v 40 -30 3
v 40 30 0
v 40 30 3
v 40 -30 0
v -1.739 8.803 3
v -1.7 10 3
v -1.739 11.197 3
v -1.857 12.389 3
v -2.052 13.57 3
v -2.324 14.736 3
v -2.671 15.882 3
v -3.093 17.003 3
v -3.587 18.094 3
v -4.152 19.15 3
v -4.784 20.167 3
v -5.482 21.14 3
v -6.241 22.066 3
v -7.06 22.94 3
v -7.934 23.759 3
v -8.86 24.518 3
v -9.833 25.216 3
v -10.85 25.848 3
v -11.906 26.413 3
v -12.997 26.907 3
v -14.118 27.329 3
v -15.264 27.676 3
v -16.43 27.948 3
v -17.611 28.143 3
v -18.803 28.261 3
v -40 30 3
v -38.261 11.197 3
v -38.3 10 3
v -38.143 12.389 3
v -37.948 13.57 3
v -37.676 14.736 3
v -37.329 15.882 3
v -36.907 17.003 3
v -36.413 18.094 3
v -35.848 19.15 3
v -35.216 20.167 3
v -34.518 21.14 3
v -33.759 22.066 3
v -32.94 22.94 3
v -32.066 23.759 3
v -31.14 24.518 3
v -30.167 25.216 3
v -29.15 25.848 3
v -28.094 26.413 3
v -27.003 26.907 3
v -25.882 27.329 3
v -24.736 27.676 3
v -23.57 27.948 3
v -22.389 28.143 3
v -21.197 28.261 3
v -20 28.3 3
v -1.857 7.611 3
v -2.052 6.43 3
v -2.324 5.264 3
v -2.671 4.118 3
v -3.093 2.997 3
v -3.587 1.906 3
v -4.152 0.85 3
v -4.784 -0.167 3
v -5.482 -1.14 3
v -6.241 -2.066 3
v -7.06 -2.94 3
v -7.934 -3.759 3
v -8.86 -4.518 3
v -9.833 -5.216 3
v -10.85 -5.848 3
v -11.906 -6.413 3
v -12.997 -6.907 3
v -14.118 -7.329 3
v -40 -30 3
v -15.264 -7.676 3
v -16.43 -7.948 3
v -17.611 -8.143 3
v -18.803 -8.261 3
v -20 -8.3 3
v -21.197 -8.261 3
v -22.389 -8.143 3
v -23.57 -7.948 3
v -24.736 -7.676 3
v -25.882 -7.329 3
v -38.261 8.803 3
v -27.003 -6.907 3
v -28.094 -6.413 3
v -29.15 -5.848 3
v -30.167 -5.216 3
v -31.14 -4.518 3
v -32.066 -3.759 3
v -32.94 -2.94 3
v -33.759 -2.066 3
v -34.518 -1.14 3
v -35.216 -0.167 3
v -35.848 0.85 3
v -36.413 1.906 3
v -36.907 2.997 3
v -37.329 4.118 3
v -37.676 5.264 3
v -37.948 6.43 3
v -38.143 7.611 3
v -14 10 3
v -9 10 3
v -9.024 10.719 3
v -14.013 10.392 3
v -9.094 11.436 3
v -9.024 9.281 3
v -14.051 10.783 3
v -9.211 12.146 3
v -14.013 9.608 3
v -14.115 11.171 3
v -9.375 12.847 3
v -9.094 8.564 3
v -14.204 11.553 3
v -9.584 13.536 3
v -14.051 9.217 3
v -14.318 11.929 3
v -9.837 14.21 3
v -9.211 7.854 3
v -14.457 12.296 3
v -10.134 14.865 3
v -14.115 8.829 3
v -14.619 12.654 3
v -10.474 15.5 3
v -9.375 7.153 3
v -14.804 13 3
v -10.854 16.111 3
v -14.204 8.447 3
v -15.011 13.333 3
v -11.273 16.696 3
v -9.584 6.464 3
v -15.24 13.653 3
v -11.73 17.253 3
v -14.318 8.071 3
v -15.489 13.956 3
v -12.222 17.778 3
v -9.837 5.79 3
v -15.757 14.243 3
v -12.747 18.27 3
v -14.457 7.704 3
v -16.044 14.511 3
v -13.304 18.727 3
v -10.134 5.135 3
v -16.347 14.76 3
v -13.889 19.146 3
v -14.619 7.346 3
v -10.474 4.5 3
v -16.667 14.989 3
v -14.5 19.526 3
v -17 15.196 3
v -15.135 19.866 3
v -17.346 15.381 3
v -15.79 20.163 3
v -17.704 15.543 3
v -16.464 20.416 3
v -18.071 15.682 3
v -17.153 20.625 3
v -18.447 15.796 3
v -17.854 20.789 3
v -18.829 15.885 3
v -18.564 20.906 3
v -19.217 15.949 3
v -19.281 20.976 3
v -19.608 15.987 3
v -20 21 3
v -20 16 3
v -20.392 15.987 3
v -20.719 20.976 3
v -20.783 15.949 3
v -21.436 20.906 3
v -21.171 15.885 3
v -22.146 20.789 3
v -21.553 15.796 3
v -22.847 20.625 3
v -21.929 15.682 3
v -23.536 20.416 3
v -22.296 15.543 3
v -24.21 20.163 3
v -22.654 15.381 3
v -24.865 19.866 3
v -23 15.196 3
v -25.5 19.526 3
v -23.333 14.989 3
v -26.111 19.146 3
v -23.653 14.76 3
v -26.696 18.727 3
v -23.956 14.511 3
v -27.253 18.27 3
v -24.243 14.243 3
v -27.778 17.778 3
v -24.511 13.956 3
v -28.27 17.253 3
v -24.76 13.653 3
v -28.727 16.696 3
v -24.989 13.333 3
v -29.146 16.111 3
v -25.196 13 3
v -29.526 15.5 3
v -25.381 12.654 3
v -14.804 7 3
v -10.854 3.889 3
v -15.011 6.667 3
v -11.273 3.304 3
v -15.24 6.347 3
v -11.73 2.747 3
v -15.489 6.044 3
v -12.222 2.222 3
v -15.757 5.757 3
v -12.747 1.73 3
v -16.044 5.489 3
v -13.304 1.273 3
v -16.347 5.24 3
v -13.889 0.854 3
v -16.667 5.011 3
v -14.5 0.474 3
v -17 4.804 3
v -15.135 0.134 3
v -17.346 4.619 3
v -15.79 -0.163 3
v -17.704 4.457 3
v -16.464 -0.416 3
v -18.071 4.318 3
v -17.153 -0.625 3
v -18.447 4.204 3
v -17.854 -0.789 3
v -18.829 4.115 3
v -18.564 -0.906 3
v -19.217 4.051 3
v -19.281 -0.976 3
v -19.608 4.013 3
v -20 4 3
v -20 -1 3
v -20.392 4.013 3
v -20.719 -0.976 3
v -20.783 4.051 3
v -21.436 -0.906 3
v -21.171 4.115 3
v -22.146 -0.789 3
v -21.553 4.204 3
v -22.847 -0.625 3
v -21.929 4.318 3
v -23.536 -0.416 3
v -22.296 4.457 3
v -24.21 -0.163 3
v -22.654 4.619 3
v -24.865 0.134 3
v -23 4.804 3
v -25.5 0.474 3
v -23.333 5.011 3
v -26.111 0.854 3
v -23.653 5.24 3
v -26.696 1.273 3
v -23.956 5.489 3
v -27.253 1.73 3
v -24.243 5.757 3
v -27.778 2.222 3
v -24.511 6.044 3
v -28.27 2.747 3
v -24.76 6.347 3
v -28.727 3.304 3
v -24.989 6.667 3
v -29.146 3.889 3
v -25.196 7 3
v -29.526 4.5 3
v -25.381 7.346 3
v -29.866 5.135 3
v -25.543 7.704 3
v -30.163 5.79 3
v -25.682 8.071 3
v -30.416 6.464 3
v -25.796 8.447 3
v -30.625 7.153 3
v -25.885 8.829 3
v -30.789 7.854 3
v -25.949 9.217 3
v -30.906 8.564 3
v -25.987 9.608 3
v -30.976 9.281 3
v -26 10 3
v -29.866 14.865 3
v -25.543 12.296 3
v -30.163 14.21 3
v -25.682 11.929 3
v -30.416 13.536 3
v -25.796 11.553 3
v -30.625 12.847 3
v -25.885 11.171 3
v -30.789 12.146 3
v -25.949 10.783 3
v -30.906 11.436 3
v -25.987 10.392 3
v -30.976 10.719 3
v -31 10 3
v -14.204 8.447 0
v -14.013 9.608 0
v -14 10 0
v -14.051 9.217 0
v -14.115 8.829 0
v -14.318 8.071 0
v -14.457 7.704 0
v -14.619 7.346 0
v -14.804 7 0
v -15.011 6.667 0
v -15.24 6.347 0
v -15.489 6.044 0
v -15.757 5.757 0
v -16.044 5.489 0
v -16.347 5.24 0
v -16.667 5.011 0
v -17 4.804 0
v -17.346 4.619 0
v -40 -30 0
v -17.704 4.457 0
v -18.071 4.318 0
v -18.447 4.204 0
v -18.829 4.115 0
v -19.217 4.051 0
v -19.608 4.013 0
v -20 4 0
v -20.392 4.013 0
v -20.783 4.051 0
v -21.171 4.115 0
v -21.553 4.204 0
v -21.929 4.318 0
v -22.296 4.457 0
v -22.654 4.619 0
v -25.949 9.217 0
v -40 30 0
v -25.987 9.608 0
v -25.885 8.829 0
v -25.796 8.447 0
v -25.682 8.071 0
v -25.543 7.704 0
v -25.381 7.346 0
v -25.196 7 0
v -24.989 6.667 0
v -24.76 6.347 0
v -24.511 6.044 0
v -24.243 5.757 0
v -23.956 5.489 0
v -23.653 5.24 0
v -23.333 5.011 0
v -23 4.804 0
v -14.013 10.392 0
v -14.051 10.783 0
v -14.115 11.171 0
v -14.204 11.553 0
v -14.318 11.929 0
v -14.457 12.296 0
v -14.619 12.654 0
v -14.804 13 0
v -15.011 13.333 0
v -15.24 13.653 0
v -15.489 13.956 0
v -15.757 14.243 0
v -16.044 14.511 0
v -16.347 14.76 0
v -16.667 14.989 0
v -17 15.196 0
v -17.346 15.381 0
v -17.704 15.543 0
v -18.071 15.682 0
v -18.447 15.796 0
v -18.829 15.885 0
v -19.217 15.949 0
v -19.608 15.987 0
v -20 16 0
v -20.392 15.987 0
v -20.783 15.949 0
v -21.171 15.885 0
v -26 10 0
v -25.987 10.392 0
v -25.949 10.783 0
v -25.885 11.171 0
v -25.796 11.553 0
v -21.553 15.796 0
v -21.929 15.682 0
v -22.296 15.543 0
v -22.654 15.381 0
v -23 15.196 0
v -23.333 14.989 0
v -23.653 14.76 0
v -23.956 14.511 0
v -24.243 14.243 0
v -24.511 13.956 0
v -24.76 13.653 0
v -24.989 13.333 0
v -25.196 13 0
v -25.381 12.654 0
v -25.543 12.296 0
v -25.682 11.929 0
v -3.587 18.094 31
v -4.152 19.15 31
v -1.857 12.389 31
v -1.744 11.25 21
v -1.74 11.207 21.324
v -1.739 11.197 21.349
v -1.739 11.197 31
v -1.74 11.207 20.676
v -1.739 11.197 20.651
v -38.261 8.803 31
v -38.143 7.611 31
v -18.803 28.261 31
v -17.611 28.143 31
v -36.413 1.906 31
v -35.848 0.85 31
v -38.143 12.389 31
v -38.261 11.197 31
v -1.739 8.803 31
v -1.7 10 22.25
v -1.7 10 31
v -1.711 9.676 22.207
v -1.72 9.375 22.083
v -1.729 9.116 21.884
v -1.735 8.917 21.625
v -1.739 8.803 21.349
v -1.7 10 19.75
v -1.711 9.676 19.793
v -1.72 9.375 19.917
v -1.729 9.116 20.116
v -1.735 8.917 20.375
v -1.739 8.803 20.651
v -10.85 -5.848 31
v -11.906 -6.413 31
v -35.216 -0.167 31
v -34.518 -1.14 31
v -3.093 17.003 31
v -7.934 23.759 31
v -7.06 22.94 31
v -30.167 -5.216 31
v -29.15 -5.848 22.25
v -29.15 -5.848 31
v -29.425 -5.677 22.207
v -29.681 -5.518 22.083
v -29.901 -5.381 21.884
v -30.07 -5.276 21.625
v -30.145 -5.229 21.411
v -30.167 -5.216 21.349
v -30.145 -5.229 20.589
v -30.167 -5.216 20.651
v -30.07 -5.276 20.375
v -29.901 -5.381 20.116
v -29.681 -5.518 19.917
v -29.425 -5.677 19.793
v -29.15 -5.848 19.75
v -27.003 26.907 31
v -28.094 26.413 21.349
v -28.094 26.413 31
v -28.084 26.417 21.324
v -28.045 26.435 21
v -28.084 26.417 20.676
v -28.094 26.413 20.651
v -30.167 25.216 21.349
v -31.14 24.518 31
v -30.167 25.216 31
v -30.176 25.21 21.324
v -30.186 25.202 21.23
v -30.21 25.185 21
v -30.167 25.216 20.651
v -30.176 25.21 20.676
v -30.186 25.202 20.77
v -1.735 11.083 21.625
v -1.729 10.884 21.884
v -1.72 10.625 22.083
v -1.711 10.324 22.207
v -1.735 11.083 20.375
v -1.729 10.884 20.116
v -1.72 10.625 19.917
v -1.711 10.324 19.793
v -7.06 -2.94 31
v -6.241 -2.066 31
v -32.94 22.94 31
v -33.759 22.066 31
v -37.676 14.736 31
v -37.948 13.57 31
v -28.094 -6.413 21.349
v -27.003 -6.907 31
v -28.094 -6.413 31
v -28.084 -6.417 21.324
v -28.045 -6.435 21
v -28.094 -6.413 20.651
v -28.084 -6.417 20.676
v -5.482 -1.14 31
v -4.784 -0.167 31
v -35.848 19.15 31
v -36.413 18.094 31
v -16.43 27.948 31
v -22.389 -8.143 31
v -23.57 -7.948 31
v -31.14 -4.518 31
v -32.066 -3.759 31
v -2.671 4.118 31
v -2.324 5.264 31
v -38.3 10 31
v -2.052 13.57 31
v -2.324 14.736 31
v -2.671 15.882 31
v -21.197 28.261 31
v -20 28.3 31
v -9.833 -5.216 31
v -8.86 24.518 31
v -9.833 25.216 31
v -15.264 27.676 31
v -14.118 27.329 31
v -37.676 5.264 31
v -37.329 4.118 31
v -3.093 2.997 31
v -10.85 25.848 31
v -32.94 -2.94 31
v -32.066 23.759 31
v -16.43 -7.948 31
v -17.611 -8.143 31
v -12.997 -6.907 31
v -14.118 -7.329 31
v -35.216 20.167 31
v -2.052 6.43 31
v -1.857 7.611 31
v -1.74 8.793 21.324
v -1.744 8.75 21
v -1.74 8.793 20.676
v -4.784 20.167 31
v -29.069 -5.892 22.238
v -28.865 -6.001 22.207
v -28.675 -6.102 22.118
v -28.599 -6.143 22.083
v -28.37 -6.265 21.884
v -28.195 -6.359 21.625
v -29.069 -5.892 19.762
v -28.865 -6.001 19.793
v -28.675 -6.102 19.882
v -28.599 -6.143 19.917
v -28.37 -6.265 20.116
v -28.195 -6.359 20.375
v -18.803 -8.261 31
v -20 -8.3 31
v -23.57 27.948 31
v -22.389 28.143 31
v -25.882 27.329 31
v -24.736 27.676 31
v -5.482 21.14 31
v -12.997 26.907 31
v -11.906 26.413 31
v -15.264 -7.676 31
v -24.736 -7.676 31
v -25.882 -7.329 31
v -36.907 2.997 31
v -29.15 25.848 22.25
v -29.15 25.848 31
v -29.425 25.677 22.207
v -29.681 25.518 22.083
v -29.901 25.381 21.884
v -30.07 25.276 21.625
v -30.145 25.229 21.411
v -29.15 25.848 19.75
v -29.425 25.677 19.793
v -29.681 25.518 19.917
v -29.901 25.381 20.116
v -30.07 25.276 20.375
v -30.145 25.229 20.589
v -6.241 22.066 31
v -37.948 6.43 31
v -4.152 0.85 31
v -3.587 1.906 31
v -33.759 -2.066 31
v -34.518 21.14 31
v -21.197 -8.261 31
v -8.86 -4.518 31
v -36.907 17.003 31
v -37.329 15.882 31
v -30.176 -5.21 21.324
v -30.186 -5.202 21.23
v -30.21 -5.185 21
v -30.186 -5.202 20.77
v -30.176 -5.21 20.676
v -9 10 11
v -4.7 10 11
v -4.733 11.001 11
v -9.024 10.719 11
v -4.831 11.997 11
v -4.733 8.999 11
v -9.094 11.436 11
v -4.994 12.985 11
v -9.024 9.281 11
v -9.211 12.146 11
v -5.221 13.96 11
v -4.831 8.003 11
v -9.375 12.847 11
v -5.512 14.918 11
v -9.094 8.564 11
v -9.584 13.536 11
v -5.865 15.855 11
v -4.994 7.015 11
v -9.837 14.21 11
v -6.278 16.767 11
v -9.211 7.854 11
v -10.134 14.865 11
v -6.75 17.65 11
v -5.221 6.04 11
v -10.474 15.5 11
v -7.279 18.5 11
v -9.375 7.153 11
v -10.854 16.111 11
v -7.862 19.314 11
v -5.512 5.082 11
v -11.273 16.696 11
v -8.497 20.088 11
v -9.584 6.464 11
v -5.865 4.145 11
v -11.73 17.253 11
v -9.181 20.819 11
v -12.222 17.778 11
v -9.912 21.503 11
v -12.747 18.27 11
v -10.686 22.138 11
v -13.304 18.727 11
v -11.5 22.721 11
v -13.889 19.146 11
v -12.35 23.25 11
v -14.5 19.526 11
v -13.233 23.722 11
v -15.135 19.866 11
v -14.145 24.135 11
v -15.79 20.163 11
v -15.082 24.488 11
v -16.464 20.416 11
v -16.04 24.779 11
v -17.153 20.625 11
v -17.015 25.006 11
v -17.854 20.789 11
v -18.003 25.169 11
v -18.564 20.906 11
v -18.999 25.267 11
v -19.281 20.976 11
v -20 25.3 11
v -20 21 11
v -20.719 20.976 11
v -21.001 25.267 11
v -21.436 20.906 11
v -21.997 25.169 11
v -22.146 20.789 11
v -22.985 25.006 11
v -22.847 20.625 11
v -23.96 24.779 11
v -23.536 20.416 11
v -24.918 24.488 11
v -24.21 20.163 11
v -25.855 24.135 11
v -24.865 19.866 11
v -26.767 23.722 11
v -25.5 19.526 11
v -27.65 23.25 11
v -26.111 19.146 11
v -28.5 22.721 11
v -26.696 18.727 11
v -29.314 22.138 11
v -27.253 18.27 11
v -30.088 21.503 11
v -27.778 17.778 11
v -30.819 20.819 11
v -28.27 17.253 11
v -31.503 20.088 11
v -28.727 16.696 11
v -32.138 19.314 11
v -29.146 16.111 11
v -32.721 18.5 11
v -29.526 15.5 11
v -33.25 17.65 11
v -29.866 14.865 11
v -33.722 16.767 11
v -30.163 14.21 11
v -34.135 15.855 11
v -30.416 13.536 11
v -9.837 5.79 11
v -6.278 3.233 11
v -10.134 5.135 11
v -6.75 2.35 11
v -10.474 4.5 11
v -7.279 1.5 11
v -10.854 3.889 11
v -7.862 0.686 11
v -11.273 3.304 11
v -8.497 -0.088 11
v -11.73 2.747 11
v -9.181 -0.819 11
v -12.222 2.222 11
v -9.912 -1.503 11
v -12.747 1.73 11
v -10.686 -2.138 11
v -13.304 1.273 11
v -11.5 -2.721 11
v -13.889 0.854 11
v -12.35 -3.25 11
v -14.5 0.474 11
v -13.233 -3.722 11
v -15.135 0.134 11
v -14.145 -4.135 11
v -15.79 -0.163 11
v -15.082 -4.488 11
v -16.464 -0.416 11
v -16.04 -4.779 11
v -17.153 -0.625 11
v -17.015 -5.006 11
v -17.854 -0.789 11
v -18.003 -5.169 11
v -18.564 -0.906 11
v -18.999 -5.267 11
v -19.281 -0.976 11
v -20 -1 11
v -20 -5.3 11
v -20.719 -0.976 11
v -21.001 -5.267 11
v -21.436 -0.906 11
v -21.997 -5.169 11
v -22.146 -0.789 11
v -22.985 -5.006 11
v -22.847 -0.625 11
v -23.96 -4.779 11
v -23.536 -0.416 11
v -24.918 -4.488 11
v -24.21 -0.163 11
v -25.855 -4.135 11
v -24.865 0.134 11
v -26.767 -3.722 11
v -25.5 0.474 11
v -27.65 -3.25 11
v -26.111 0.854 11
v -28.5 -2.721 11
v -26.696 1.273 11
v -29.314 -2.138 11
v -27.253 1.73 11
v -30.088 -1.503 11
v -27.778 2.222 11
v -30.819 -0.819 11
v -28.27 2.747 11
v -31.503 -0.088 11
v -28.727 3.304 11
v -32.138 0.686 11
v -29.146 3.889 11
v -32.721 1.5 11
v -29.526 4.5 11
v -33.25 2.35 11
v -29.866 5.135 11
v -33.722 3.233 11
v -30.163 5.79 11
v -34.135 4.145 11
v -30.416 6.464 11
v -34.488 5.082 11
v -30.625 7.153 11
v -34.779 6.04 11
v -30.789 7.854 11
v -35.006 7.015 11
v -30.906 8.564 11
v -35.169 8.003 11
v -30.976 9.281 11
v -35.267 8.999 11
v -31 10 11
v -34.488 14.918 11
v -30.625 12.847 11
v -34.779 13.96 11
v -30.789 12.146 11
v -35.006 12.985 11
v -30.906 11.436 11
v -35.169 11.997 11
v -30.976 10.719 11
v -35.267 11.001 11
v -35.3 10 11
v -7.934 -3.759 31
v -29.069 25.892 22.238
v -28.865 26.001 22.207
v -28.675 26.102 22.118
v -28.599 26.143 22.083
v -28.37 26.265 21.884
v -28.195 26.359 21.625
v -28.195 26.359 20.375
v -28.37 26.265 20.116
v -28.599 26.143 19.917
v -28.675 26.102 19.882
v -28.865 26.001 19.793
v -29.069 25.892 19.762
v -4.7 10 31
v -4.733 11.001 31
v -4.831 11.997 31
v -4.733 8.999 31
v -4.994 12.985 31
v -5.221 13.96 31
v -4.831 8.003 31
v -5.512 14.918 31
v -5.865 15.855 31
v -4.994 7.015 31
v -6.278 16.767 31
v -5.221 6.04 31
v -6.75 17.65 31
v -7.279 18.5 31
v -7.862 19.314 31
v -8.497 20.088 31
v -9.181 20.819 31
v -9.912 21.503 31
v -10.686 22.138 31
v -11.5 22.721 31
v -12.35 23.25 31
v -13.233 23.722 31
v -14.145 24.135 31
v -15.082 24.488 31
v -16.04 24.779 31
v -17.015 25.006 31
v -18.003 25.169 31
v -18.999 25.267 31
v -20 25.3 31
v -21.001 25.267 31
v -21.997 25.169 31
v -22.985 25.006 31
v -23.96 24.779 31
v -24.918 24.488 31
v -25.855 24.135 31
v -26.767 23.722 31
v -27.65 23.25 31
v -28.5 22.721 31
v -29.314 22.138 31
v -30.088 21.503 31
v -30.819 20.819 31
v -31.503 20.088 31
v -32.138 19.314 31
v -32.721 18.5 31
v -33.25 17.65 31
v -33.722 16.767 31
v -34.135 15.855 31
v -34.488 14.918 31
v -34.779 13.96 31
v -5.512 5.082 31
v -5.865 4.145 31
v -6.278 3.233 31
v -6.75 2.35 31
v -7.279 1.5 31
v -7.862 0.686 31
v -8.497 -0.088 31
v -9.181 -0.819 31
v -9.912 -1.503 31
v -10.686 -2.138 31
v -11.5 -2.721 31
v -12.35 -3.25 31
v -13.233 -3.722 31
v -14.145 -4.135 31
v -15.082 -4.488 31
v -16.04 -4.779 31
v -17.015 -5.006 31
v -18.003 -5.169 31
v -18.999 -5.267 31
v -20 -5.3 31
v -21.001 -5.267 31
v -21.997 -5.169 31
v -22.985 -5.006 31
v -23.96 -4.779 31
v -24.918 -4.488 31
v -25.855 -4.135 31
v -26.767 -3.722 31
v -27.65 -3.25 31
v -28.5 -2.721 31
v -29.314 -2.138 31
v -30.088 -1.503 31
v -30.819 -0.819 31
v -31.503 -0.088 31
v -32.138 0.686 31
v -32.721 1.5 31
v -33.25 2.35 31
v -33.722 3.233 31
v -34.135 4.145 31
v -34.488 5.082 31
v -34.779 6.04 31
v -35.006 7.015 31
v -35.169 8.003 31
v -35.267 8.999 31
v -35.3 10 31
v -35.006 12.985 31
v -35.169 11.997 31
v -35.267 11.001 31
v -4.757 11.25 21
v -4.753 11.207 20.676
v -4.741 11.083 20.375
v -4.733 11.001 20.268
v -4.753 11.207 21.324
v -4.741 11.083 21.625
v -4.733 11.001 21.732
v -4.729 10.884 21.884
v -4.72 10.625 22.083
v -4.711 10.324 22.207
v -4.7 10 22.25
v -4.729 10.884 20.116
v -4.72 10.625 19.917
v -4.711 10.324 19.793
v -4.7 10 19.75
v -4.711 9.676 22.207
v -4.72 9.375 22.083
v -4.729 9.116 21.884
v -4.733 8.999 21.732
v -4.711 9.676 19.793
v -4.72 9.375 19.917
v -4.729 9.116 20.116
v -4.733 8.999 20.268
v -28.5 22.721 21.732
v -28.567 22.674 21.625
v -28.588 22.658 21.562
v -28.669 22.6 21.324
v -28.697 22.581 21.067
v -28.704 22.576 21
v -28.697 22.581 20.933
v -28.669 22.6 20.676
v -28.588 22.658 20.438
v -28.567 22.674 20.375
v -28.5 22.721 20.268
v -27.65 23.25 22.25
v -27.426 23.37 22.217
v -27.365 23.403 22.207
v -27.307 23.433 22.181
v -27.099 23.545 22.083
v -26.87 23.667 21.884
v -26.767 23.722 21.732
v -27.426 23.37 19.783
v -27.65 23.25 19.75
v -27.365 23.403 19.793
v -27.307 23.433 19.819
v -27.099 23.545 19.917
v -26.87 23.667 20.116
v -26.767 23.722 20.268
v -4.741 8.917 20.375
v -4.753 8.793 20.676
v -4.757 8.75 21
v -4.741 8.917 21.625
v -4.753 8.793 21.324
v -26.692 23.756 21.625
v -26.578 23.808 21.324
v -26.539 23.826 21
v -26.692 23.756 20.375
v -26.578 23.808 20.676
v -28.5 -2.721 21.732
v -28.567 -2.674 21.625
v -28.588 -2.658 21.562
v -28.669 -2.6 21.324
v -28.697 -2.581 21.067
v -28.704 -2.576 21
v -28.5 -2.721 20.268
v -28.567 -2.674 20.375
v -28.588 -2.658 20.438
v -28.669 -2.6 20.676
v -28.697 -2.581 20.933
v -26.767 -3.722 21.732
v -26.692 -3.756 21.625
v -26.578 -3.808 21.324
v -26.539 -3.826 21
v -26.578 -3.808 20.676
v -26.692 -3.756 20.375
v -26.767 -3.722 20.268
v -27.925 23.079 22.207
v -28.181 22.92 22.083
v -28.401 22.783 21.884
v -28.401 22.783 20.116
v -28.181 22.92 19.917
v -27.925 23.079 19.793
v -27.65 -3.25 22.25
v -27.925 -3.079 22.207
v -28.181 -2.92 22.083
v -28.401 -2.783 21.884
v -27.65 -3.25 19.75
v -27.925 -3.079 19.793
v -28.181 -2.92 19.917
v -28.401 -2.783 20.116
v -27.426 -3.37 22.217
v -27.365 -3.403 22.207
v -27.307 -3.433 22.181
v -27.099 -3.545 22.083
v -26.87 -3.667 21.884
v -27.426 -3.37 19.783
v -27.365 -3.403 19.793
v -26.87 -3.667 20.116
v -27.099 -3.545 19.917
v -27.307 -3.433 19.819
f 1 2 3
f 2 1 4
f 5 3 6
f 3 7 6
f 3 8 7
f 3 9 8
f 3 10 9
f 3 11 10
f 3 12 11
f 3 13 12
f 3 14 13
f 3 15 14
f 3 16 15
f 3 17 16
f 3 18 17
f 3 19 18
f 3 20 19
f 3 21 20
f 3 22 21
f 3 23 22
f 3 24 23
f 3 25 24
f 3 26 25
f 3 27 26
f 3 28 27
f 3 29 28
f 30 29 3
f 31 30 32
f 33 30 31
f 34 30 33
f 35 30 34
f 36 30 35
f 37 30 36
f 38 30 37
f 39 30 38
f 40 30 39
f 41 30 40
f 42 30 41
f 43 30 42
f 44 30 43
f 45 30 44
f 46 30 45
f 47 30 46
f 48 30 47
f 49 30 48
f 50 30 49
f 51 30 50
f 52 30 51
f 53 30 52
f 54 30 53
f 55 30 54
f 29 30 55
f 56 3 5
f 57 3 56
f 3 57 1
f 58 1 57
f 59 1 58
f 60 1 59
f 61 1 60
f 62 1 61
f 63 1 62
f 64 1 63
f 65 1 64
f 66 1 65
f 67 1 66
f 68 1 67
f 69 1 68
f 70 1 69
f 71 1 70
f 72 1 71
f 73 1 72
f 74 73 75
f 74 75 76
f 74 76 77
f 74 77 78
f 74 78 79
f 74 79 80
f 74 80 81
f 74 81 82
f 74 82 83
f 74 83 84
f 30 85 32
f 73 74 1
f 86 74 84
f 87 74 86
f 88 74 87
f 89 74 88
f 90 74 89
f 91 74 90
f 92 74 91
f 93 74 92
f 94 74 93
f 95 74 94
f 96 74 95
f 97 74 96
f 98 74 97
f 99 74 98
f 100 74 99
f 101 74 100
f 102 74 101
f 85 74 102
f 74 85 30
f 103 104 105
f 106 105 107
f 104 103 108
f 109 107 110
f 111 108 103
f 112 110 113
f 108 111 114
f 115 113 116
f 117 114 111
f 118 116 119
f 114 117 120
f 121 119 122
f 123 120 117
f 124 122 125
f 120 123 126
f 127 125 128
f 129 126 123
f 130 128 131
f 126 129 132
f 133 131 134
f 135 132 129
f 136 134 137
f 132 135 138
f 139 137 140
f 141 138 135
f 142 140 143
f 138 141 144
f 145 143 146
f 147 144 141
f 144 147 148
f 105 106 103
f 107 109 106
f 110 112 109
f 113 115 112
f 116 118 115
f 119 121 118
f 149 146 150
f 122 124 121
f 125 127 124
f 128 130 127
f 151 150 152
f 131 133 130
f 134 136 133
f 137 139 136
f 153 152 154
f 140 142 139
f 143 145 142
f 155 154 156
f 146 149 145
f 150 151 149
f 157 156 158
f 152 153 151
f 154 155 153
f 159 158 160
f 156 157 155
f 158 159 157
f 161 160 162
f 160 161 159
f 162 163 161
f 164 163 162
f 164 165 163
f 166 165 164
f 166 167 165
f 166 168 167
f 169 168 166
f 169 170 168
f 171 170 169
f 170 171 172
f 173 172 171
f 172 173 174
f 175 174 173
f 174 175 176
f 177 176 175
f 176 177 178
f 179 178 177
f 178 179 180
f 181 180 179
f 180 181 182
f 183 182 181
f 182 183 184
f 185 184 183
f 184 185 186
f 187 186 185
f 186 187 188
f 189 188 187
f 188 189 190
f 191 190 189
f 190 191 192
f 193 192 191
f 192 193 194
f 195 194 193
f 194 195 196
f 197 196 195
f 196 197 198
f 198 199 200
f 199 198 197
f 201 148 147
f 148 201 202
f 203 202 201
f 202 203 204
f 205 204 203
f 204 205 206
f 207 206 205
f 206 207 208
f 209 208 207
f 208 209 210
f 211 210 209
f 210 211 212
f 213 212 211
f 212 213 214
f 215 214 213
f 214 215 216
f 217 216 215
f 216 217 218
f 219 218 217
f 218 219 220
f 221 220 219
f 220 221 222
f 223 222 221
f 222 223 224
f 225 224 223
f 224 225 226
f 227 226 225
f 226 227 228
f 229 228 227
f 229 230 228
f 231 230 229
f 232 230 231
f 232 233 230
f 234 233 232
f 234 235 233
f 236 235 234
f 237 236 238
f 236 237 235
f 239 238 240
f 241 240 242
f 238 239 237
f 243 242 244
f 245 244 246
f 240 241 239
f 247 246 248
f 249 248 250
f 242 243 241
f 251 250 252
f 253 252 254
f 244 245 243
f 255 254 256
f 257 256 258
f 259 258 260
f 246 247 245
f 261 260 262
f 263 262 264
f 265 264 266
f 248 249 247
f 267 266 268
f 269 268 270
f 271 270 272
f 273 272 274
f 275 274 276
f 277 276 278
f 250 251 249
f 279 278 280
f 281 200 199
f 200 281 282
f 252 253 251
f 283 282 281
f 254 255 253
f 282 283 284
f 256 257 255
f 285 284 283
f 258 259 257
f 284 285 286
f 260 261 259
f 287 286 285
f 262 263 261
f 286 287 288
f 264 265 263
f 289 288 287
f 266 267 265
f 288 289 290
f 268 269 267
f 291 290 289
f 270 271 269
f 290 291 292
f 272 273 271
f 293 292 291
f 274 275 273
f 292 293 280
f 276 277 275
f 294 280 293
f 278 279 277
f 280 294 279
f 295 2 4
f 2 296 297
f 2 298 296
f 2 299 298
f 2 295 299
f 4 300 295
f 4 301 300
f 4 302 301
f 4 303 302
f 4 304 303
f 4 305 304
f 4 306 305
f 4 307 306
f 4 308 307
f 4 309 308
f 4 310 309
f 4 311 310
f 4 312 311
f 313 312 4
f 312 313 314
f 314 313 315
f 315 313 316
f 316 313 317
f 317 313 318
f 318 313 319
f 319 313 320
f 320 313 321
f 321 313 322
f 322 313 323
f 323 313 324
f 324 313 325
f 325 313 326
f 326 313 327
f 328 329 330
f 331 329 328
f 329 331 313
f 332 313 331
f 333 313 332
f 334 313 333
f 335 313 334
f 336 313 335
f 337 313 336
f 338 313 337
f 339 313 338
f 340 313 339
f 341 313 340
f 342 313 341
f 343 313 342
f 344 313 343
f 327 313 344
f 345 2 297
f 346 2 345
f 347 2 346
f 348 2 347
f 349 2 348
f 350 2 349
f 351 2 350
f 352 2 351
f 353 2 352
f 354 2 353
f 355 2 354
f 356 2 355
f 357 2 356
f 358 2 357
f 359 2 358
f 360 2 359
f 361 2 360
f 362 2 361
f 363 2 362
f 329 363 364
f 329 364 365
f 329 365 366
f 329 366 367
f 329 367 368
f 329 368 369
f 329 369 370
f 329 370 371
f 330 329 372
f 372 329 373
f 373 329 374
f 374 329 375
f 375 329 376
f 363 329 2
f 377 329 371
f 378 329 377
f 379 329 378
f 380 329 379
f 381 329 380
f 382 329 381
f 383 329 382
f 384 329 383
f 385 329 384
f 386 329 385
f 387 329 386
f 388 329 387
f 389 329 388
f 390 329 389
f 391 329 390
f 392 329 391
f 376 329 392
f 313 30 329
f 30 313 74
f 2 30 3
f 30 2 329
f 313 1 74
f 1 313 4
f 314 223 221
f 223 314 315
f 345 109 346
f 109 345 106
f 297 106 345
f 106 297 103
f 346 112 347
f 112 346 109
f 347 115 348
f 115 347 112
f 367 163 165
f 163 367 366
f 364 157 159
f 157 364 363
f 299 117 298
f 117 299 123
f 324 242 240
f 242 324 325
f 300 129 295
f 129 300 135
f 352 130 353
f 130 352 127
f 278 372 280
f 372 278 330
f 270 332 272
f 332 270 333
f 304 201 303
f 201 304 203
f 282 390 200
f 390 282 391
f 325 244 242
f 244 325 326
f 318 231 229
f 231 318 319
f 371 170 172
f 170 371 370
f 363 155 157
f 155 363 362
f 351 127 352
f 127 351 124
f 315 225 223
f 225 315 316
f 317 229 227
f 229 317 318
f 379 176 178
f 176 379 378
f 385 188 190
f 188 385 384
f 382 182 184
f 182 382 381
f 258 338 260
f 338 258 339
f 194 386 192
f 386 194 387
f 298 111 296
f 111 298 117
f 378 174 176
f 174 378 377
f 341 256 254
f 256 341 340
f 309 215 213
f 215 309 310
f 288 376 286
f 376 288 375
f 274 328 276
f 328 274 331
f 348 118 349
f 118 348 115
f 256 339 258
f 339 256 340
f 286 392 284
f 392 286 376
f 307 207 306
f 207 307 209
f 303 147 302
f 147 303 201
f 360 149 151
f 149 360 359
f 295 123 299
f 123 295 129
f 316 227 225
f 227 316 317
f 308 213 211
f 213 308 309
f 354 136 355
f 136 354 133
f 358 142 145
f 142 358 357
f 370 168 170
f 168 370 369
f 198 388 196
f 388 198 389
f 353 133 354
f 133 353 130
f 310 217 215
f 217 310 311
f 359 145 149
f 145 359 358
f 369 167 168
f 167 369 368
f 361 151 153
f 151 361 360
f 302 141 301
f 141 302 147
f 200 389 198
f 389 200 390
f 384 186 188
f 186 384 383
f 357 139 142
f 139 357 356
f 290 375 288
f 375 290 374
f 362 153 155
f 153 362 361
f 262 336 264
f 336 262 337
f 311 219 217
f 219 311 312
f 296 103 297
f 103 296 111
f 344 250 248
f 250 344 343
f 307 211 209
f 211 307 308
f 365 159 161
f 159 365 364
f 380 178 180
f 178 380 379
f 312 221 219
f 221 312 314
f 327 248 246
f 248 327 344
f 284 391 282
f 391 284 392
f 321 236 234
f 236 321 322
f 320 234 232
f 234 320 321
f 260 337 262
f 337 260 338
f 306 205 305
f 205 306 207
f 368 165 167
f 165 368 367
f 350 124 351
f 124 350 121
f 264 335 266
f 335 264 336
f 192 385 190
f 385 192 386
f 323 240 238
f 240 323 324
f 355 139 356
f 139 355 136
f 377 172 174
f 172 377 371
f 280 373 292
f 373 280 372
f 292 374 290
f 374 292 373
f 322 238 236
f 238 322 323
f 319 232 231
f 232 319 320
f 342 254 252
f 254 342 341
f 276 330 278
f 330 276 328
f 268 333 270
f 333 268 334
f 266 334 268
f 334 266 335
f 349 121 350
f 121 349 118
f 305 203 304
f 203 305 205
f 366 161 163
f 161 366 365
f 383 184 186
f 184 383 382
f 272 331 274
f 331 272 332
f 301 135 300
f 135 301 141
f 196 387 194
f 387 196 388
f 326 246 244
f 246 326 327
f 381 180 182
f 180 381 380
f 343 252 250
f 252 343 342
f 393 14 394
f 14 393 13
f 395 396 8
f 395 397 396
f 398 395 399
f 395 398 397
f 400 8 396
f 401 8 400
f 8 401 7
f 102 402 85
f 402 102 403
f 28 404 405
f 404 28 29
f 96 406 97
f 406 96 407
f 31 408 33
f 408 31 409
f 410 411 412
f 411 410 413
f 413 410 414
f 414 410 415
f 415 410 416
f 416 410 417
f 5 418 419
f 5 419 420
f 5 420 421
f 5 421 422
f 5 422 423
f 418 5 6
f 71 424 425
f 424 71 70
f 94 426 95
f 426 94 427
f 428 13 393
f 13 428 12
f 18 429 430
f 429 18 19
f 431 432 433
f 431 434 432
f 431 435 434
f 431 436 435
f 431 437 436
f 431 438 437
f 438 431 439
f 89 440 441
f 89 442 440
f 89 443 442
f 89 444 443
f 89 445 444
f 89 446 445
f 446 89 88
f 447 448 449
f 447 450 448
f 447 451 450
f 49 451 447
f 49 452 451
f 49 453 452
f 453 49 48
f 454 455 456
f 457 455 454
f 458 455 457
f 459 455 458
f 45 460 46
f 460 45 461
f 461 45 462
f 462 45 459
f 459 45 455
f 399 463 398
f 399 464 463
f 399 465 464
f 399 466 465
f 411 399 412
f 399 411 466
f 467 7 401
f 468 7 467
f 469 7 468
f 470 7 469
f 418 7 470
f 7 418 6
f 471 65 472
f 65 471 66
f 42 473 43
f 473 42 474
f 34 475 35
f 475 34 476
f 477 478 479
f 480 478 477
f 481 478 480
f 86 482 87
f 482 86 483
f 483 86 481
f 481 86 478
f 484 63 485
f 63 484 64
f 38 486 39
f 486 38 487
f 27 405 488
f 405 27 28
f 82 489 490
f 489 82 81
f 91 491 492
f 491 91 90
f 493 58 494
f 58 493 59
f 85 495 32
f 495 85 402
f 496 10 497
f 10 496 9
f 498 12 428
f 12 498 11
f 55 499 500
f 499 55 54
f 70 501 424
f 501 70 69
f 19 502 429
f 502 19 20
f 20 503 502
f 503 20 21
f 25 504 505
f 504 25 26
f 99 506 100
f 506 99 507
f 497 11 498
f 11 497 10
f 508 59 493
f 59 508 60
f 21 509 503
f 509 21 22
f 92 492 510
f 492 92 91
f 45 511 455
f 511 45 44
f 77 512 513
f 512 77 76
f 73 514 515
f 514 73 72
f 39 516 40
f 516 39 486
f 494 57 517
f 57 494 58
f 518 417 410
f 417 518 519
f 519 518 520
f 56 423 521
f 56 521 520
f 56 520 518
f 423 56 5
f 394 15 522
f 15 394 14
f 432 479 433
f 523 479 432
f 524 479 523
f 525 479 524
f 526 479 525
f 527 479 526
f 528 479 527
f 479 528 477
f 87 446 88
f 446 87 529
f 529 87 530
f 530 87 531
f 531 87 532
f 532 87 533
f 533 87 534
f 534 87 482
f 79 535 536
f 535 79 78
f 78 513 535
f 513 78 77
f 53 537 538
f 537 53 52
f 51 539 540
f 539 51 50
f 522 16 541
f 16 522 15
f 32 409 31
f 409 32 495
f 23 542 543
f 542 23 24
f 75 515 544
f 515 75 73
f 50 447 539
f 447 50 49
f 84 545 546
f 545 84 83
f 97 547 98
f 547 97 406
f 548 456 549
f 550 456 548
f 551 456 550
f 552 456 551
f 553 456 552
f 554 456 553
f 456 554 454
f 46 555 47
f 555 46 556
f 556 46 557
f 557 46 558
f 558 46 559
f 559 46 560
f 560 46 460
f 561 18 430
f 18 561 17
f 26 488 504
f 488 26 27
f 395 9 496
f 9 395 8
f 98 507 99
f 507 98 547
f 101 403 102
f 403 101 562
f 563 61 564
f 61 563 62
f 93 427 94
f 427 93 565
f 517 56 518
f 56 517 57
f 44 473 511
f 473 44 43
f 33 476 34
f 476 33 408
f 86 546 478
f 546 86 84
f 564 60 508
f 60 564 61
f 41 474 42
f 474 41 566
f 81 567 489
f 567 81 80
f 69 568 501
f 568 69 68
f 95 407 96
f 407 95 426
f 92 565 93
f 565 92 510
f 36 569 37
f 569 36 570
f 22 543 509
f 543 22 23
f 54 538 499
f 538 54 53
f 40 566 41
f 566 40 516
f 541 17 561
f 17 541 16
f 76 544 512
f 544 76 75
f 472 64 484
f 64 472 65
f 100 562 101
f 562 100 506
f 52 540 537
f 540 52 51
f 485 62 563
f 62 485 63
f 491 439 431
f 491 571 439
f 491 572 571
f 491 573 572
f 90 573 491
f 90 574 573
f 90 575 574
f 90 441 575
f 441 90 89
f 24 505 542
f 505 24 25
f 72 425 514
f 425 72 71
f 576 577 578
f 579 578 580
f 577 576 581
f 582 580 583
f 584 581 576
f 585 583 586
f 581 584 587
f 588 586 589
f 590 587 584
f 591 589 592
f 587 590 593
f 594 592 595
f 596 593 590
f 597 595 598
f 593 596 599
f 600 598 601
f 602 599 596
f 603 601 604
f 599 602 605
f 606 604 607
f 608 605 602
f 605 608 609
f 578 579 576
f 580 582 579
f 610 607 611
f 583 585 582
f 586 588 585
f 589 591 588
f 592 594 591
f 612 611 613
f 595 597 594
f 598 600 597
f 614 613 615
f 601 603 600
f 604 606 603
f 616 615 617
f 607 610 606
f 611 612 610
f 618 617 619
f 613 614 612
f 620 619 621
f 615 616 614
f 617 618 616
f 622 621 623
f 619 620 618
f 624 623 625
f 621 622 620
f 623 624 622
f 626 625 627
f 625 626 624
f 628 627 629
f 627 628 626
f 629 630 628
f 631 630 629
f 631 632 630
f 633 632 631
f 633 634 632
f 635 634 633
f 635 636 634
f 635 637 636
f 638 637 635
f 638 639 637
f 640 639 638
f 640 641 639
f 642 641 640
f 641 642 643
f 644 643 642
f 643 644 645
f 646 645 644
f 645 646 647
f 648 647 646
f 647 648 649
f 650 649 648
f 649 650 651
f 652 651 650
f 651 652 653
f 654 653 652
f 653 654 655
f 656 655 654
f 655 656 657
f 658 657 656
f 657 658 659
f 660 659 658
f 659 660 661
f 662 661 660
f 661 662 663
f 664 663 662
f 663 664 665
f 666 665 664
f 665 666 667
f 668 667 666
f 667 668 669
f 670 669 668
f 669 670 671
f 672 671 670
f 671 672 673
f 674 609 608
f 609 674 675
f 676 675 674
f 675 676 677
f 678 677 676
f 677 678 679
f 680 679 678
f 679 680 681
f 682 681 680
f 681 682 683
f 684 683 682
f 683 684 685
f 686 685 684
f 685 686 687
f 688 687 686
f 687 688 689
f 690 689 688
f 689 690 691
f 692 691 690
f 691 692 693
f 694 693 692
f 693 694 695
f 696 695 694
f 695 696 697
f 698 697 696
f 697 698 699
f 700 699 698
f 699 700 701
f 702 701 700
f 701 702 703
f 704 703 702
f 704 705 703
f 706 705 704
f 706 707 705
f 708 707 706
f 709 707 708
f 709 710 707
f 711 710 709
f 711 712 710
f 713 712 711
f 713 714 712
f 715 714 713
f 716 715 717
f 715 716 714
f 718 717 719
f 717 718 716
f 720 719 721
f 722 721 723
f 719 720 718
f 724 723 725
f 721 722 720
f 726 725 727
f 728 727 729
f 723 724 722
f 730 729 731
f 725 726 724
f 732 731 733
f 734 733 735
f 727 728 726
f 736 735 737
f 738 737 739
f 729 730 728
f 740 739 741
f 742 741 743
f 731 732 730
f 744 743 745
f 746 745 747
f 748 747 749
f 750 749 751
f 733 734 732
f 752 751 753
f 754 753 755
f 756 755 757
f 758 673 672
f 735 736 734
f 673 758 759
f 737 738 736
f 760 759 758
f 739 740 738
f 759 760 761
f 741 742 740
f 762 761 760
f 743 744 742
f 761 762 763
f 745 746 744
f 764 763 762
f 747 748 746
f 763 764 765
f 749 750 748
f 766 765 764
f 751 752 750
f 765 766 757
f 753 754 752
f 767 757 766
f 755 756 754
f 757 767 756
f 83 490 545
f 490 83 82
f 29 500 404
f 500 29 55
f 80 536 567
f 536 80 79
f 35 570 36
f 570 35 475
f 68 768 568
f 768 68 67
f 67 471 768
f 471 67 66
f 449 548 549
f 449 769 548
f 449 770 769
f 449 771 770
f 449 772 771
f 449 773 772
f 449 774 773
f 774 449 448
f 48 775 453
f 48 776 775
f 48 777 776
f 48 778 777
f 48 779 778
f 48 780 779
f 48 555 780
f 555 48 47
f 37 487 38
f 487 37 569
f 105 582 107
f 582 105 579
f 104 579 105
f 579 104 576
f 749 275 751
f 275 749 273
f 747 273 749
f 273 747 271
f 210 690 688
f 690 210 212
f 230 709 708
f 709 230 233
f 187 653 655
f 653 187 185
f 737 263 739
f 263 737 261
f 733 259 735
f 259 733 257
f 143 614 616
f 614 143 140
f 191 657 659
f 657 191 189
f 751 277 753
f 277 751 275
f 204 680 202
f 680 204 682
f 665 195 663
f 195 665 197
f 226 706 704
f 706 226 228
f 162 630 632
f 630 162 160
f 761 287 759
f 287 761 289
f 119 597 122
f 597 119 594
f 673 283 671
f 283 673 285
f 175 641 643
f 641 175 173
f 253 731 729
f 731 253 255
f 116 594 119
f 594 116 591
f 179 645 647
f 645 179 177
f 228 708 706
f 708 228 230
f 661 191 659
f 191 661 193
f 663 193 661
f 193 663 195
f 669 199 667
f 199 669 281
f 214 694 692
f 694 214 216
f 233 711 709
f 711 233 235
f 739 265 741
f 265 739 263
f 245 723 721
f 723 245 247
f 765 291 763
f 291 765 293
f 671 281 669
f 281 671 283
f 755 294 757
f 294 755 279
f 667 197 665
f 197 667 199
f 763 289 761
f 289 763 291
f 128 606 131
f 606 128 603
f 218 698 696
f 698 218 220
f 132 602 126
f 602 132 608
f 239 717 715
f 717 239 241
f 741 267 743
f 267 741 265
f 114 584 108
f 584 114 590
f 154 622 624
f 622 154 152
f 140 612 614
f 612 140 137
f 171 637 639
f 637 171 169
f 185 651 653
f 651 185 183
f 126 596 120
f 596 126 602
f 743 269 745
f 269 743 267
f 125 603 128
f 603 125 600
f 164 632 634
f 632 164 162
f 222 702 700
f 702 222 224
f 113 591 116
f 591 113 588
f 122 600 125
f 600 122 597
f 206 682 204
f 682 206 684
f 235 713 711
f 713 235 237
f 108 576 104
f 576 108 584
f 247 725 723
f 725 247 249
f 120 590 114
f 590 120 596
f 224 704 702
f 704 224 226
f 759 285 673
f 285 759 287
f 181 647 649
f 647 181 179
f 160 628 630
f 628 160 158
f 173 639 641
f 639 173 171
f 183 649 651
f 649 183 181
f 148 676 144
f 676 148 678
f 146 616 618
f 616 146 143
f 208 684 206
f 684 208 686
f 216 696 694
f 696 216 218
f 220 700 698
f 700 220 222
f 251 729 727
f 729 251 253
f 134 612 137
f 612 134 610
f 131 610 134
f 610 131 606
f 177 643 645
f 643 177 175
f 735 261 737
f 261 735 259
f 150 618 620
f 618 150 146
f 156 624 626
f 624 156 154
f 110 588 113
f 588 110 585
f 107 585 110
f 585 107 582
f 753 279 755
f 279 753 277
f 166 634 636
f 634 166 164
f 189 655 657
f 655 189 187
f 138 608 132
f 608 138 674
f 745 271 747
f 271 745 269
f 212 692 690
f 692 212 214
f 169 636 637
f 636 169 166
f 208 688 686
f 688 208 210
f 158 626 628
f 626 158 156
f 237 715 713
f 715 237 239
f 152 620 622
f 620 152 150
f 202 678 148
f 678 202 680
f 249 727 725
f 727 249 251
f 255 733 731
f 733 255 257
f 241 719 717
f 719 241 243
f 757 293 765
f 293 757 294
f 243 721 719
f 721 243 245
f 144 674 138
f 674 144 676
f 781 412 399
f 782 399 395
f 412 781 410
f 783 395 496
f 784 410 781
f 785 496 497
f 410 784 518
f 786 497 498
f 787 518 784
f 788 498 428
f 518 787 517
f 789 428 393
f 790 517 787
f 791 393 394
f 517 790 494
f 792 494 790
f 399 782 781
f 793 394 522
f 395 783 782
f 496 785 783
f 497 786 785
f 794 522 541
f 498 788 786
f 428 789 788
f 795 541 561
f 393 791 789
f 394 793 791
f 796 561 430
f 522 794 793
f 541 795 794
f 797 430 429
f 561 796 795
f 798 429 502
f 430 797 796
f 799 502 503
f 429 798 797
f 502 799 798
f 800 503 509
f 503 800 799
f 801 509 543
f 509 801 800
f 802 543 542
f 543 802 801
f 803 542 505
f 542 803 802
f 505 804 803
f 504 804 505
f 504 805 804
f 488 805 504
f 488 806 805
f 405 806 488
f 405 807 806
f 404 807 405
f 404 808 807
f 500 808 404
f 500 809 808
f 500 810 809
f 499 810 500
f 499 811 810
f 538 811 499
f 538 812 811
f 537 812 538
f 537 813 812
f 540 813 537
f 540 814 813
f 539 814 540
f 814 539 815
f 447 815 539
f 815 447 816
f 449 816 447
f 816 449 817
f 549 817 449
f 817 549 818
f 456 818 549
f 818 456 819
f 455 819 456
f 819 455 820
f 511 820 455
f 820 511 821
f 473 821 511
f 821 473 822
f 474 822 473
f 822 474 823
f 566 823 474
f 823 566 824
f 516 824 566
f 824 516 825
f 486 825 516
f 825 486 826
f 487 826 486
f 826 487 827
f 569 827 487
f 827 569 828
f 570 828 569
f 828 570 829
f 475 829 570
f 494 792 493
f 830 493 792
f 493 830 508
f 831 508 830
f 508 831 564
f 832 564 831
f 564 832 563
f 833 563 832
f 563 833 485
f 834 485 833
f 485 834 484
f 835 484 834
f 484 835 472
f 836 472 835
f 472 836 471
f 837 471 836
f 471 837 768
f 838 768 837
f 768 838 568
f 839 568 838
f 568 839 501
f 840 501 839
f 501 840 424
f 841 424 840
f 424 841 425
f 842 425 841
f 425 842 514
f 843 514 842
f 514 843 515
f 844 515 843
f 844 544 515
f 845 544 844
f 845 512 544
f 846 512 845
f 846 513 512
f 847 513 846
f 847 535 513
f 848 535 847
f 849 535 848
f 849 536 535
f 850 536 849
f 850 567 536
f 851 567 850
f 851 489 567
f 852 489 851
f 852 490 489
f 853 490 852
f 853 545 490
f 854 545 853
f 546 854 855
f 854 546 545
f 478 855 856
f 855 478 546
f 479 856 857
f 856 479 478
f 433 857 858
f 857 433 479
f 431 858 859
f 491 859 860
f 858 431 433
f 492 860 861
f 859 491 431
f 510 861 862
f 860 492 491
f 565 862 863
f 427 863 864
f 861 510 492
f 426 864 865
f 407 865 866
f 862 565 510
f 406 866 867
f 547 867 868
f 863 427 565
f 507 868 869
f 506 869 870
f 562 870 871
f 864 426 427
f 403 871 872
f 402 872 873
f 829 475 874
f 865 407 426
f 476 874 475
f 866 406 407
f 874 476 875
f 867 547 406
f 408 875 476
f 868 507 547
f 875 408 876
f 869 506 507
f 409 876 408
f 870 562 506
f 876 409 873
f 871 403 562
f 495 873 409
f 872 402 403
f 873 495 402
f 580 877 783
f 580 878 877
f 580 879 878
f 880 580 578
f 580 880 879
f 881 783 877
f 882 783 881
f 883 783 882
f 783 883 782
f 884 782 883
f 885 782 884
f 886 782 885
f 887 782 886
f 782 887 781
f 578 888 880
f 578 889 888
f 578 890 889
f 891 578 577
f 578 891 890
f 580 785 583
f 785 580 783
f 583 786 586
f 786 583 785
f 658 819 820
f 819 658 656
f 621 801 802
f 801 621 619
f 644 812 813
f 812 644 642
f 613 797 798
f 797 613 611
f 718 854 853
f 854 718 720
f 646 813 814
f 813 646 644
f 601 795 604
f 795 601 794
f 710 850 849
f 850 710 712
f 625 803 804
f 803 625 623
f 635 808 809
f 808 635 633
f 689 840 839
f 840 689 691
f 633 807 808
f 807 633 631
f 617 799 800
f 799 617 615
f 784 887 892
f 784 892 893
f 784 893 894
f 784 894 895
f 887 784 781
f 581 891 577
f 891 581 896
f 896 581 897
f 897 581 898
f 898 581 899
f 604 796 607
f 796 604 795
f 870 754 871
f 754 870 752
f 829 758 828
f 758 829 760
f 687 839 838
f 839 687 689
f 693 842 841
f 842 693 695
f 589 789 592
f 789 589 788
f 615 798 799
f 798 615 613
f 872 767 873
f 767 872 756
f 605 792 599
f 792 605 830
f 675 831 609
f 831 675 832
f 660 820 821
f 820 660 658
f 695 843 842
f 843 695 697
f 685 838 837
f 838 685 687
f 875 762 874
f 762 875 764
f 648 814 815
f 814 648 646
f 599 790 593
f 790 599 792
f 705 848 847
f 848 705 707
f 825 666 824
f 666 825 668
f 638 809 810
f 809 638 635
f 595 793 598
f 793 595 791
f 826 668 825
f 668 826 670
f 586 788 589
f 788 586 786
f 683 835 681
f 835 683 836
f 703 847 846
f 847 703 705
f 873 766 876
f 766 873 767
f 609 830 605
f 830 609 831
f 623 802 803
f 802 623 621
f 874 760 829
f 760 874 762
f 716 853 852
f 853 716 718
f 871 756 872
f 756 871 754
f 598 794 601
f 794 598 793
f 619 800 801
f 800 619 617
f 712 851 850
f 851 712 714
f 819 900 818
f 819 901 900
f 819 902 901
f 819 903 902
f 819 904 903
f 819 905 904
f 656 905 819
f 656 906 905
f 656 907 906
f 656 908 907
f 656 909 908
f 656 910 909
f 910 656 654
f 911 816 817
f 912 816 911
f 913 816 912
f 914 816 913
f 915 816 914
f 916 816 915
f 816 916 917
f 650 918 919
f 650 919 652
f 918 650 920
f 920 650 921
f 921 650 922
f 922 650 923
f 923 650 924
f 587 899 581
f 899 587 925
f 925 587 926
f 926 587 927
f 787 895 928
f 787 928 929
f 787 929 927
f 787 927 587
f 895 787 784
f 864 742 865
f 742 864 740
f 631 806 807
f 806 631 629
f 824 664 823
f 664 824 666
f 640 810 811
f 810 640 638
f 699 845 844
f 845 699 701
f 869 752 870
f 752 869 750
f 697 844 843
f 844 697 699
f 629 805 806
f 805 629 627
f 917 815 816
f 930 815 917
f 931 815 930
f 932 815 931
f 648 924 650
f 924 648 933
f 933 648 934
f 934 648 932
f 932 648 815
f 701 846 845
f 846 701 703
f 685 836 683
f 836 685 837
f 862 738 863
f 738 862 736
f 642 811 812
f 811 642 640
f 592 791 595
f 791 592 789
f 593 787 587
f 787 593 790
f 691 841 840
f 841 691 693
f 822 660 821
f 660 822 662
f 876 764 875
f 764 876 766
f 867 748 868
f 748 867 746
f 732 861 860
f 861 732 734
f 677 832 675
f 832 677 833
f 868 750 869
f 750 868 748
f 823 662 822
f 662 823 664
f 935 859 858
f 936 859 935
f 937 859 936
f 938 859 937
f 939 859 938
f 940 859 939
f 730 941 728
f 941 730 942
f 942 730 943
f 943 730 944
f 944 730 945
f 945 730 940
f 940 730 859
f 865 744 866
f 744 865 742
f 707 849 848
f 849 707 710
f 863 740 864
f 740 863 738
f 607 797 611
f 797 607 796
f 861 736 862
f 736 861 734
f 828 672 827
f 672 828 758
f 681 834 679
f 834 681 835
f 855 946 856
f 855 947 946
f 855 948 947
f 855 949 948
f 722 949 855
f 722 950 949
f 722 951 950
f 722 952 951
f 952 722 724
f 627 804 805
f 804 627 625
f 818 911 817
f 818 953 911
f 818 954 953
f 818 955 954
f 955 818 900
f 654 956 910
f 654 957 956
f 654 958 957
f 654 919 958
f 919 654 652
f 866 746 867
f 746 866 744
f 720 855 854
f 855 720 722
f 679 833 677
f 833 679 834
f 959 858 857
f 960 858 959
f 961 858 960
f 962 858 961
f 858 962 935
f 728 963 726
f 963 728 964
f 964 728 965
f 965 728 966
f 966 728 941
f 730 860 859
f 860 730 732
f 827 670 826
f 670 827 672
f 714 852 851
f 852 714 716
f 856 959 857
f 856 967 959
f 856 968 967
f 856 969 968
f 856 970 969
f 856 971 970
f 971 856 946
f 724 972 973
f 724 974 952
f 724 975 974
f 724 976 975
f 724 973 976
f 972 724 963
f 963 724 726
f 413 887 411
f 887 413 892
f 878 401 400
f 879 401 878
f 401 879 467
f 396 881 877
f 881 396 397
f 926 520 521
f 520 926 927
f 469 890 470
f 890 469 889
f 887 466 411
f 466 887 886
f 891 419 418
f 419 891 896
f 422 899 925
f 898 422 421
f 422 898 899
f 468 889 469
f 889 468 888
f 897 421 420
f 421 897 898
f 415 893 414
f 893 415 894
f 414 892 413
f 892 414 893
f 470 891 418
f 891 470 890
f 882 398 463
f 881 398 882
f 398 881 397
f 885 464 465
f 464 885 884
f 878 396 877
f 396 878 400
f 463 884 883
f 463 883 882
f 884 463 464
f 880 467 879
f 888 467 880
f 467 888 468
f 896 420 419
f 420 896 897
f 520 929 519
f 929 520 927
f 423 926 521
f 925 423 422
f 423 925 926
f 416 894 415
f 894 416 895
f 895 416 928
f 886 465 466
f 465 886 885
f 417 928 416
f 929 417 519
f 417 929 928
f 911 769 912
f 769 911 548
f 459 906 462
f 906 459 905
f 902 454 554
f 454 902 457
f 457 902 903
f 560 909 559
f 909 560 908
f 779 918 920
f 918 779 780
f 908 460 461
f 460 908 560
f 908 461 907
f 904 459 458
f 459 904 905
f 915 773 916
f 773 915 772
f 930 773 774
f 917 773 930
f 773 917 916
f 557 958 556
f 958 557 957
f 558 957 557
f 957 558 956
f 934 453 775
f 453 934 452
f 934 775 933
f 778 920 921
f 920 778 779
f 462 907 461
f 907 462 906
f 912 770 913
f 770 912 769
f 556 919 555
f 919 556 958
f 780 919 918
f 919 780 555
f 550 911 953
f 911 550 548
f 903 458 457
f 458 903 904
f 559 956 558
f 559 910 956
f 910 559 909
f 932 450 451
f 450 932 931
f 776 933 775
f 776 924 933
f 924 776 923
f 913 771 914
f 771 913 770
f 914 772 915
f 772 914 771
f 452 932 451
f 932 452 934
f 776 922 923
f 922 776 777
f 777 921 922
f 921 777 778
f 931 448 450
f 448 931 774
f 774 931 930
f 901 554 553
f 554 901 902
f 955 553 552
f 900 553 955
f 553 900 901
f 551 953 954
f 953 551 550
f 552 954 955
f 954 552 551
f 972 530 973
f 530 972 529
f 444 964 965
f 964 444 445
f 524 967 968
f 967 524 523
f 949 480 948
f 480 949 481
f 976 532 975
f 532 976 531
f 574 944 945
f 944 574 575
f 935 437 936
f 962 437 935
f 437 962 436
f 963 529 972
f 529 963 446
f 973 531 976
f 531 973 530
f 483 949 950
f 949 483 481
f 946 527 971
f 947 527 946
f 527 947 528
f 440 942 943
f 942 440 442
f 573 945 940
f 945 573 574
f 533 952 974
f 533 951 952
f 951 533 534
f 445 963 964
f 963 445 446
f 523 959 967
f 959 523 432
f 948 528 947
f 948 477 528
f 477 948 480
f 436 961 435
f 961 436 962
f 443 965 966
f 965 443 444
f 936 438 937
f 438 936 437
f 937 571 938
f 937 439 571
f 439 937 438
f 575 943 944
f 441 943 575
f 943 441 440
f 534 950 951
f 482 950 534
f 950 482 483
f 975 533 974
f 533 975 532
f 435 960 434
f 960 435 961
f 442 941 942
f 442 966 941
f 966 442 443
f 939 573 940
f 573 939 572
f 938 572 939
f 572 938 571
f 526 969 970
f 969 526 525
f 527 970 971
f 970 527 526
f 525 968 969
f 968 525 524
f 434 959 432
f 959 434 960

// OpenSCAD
// KNOWN-RIGHT ALTERNATIVE (must pass): a correct part coded independently, the sleeve as two stacked tubes
$fn=96;
module tube(od,id,h) difference(){ cylinder(d=od,h=h); translate([0,0,-1]) cylinder(d=id,h=h+2); }
difference(){ union(){ difference(){ translate([-40,-30,0]) cube([80,60,3]); translate([-20,10,-1]) cylinder(d=12,h=5);} 
 translate([-20,10,3]) tube(36.6,22,8); translate([-20,10,11]) tube(36.6,30.6,20); }
 for(a=[0:120:240]) translate([-20,10,21]) rotate([0,0,a]) translate([14,0,0]) rotate([0,90,0]) cylinder(d=2.5,h=6,$fn=24); }
